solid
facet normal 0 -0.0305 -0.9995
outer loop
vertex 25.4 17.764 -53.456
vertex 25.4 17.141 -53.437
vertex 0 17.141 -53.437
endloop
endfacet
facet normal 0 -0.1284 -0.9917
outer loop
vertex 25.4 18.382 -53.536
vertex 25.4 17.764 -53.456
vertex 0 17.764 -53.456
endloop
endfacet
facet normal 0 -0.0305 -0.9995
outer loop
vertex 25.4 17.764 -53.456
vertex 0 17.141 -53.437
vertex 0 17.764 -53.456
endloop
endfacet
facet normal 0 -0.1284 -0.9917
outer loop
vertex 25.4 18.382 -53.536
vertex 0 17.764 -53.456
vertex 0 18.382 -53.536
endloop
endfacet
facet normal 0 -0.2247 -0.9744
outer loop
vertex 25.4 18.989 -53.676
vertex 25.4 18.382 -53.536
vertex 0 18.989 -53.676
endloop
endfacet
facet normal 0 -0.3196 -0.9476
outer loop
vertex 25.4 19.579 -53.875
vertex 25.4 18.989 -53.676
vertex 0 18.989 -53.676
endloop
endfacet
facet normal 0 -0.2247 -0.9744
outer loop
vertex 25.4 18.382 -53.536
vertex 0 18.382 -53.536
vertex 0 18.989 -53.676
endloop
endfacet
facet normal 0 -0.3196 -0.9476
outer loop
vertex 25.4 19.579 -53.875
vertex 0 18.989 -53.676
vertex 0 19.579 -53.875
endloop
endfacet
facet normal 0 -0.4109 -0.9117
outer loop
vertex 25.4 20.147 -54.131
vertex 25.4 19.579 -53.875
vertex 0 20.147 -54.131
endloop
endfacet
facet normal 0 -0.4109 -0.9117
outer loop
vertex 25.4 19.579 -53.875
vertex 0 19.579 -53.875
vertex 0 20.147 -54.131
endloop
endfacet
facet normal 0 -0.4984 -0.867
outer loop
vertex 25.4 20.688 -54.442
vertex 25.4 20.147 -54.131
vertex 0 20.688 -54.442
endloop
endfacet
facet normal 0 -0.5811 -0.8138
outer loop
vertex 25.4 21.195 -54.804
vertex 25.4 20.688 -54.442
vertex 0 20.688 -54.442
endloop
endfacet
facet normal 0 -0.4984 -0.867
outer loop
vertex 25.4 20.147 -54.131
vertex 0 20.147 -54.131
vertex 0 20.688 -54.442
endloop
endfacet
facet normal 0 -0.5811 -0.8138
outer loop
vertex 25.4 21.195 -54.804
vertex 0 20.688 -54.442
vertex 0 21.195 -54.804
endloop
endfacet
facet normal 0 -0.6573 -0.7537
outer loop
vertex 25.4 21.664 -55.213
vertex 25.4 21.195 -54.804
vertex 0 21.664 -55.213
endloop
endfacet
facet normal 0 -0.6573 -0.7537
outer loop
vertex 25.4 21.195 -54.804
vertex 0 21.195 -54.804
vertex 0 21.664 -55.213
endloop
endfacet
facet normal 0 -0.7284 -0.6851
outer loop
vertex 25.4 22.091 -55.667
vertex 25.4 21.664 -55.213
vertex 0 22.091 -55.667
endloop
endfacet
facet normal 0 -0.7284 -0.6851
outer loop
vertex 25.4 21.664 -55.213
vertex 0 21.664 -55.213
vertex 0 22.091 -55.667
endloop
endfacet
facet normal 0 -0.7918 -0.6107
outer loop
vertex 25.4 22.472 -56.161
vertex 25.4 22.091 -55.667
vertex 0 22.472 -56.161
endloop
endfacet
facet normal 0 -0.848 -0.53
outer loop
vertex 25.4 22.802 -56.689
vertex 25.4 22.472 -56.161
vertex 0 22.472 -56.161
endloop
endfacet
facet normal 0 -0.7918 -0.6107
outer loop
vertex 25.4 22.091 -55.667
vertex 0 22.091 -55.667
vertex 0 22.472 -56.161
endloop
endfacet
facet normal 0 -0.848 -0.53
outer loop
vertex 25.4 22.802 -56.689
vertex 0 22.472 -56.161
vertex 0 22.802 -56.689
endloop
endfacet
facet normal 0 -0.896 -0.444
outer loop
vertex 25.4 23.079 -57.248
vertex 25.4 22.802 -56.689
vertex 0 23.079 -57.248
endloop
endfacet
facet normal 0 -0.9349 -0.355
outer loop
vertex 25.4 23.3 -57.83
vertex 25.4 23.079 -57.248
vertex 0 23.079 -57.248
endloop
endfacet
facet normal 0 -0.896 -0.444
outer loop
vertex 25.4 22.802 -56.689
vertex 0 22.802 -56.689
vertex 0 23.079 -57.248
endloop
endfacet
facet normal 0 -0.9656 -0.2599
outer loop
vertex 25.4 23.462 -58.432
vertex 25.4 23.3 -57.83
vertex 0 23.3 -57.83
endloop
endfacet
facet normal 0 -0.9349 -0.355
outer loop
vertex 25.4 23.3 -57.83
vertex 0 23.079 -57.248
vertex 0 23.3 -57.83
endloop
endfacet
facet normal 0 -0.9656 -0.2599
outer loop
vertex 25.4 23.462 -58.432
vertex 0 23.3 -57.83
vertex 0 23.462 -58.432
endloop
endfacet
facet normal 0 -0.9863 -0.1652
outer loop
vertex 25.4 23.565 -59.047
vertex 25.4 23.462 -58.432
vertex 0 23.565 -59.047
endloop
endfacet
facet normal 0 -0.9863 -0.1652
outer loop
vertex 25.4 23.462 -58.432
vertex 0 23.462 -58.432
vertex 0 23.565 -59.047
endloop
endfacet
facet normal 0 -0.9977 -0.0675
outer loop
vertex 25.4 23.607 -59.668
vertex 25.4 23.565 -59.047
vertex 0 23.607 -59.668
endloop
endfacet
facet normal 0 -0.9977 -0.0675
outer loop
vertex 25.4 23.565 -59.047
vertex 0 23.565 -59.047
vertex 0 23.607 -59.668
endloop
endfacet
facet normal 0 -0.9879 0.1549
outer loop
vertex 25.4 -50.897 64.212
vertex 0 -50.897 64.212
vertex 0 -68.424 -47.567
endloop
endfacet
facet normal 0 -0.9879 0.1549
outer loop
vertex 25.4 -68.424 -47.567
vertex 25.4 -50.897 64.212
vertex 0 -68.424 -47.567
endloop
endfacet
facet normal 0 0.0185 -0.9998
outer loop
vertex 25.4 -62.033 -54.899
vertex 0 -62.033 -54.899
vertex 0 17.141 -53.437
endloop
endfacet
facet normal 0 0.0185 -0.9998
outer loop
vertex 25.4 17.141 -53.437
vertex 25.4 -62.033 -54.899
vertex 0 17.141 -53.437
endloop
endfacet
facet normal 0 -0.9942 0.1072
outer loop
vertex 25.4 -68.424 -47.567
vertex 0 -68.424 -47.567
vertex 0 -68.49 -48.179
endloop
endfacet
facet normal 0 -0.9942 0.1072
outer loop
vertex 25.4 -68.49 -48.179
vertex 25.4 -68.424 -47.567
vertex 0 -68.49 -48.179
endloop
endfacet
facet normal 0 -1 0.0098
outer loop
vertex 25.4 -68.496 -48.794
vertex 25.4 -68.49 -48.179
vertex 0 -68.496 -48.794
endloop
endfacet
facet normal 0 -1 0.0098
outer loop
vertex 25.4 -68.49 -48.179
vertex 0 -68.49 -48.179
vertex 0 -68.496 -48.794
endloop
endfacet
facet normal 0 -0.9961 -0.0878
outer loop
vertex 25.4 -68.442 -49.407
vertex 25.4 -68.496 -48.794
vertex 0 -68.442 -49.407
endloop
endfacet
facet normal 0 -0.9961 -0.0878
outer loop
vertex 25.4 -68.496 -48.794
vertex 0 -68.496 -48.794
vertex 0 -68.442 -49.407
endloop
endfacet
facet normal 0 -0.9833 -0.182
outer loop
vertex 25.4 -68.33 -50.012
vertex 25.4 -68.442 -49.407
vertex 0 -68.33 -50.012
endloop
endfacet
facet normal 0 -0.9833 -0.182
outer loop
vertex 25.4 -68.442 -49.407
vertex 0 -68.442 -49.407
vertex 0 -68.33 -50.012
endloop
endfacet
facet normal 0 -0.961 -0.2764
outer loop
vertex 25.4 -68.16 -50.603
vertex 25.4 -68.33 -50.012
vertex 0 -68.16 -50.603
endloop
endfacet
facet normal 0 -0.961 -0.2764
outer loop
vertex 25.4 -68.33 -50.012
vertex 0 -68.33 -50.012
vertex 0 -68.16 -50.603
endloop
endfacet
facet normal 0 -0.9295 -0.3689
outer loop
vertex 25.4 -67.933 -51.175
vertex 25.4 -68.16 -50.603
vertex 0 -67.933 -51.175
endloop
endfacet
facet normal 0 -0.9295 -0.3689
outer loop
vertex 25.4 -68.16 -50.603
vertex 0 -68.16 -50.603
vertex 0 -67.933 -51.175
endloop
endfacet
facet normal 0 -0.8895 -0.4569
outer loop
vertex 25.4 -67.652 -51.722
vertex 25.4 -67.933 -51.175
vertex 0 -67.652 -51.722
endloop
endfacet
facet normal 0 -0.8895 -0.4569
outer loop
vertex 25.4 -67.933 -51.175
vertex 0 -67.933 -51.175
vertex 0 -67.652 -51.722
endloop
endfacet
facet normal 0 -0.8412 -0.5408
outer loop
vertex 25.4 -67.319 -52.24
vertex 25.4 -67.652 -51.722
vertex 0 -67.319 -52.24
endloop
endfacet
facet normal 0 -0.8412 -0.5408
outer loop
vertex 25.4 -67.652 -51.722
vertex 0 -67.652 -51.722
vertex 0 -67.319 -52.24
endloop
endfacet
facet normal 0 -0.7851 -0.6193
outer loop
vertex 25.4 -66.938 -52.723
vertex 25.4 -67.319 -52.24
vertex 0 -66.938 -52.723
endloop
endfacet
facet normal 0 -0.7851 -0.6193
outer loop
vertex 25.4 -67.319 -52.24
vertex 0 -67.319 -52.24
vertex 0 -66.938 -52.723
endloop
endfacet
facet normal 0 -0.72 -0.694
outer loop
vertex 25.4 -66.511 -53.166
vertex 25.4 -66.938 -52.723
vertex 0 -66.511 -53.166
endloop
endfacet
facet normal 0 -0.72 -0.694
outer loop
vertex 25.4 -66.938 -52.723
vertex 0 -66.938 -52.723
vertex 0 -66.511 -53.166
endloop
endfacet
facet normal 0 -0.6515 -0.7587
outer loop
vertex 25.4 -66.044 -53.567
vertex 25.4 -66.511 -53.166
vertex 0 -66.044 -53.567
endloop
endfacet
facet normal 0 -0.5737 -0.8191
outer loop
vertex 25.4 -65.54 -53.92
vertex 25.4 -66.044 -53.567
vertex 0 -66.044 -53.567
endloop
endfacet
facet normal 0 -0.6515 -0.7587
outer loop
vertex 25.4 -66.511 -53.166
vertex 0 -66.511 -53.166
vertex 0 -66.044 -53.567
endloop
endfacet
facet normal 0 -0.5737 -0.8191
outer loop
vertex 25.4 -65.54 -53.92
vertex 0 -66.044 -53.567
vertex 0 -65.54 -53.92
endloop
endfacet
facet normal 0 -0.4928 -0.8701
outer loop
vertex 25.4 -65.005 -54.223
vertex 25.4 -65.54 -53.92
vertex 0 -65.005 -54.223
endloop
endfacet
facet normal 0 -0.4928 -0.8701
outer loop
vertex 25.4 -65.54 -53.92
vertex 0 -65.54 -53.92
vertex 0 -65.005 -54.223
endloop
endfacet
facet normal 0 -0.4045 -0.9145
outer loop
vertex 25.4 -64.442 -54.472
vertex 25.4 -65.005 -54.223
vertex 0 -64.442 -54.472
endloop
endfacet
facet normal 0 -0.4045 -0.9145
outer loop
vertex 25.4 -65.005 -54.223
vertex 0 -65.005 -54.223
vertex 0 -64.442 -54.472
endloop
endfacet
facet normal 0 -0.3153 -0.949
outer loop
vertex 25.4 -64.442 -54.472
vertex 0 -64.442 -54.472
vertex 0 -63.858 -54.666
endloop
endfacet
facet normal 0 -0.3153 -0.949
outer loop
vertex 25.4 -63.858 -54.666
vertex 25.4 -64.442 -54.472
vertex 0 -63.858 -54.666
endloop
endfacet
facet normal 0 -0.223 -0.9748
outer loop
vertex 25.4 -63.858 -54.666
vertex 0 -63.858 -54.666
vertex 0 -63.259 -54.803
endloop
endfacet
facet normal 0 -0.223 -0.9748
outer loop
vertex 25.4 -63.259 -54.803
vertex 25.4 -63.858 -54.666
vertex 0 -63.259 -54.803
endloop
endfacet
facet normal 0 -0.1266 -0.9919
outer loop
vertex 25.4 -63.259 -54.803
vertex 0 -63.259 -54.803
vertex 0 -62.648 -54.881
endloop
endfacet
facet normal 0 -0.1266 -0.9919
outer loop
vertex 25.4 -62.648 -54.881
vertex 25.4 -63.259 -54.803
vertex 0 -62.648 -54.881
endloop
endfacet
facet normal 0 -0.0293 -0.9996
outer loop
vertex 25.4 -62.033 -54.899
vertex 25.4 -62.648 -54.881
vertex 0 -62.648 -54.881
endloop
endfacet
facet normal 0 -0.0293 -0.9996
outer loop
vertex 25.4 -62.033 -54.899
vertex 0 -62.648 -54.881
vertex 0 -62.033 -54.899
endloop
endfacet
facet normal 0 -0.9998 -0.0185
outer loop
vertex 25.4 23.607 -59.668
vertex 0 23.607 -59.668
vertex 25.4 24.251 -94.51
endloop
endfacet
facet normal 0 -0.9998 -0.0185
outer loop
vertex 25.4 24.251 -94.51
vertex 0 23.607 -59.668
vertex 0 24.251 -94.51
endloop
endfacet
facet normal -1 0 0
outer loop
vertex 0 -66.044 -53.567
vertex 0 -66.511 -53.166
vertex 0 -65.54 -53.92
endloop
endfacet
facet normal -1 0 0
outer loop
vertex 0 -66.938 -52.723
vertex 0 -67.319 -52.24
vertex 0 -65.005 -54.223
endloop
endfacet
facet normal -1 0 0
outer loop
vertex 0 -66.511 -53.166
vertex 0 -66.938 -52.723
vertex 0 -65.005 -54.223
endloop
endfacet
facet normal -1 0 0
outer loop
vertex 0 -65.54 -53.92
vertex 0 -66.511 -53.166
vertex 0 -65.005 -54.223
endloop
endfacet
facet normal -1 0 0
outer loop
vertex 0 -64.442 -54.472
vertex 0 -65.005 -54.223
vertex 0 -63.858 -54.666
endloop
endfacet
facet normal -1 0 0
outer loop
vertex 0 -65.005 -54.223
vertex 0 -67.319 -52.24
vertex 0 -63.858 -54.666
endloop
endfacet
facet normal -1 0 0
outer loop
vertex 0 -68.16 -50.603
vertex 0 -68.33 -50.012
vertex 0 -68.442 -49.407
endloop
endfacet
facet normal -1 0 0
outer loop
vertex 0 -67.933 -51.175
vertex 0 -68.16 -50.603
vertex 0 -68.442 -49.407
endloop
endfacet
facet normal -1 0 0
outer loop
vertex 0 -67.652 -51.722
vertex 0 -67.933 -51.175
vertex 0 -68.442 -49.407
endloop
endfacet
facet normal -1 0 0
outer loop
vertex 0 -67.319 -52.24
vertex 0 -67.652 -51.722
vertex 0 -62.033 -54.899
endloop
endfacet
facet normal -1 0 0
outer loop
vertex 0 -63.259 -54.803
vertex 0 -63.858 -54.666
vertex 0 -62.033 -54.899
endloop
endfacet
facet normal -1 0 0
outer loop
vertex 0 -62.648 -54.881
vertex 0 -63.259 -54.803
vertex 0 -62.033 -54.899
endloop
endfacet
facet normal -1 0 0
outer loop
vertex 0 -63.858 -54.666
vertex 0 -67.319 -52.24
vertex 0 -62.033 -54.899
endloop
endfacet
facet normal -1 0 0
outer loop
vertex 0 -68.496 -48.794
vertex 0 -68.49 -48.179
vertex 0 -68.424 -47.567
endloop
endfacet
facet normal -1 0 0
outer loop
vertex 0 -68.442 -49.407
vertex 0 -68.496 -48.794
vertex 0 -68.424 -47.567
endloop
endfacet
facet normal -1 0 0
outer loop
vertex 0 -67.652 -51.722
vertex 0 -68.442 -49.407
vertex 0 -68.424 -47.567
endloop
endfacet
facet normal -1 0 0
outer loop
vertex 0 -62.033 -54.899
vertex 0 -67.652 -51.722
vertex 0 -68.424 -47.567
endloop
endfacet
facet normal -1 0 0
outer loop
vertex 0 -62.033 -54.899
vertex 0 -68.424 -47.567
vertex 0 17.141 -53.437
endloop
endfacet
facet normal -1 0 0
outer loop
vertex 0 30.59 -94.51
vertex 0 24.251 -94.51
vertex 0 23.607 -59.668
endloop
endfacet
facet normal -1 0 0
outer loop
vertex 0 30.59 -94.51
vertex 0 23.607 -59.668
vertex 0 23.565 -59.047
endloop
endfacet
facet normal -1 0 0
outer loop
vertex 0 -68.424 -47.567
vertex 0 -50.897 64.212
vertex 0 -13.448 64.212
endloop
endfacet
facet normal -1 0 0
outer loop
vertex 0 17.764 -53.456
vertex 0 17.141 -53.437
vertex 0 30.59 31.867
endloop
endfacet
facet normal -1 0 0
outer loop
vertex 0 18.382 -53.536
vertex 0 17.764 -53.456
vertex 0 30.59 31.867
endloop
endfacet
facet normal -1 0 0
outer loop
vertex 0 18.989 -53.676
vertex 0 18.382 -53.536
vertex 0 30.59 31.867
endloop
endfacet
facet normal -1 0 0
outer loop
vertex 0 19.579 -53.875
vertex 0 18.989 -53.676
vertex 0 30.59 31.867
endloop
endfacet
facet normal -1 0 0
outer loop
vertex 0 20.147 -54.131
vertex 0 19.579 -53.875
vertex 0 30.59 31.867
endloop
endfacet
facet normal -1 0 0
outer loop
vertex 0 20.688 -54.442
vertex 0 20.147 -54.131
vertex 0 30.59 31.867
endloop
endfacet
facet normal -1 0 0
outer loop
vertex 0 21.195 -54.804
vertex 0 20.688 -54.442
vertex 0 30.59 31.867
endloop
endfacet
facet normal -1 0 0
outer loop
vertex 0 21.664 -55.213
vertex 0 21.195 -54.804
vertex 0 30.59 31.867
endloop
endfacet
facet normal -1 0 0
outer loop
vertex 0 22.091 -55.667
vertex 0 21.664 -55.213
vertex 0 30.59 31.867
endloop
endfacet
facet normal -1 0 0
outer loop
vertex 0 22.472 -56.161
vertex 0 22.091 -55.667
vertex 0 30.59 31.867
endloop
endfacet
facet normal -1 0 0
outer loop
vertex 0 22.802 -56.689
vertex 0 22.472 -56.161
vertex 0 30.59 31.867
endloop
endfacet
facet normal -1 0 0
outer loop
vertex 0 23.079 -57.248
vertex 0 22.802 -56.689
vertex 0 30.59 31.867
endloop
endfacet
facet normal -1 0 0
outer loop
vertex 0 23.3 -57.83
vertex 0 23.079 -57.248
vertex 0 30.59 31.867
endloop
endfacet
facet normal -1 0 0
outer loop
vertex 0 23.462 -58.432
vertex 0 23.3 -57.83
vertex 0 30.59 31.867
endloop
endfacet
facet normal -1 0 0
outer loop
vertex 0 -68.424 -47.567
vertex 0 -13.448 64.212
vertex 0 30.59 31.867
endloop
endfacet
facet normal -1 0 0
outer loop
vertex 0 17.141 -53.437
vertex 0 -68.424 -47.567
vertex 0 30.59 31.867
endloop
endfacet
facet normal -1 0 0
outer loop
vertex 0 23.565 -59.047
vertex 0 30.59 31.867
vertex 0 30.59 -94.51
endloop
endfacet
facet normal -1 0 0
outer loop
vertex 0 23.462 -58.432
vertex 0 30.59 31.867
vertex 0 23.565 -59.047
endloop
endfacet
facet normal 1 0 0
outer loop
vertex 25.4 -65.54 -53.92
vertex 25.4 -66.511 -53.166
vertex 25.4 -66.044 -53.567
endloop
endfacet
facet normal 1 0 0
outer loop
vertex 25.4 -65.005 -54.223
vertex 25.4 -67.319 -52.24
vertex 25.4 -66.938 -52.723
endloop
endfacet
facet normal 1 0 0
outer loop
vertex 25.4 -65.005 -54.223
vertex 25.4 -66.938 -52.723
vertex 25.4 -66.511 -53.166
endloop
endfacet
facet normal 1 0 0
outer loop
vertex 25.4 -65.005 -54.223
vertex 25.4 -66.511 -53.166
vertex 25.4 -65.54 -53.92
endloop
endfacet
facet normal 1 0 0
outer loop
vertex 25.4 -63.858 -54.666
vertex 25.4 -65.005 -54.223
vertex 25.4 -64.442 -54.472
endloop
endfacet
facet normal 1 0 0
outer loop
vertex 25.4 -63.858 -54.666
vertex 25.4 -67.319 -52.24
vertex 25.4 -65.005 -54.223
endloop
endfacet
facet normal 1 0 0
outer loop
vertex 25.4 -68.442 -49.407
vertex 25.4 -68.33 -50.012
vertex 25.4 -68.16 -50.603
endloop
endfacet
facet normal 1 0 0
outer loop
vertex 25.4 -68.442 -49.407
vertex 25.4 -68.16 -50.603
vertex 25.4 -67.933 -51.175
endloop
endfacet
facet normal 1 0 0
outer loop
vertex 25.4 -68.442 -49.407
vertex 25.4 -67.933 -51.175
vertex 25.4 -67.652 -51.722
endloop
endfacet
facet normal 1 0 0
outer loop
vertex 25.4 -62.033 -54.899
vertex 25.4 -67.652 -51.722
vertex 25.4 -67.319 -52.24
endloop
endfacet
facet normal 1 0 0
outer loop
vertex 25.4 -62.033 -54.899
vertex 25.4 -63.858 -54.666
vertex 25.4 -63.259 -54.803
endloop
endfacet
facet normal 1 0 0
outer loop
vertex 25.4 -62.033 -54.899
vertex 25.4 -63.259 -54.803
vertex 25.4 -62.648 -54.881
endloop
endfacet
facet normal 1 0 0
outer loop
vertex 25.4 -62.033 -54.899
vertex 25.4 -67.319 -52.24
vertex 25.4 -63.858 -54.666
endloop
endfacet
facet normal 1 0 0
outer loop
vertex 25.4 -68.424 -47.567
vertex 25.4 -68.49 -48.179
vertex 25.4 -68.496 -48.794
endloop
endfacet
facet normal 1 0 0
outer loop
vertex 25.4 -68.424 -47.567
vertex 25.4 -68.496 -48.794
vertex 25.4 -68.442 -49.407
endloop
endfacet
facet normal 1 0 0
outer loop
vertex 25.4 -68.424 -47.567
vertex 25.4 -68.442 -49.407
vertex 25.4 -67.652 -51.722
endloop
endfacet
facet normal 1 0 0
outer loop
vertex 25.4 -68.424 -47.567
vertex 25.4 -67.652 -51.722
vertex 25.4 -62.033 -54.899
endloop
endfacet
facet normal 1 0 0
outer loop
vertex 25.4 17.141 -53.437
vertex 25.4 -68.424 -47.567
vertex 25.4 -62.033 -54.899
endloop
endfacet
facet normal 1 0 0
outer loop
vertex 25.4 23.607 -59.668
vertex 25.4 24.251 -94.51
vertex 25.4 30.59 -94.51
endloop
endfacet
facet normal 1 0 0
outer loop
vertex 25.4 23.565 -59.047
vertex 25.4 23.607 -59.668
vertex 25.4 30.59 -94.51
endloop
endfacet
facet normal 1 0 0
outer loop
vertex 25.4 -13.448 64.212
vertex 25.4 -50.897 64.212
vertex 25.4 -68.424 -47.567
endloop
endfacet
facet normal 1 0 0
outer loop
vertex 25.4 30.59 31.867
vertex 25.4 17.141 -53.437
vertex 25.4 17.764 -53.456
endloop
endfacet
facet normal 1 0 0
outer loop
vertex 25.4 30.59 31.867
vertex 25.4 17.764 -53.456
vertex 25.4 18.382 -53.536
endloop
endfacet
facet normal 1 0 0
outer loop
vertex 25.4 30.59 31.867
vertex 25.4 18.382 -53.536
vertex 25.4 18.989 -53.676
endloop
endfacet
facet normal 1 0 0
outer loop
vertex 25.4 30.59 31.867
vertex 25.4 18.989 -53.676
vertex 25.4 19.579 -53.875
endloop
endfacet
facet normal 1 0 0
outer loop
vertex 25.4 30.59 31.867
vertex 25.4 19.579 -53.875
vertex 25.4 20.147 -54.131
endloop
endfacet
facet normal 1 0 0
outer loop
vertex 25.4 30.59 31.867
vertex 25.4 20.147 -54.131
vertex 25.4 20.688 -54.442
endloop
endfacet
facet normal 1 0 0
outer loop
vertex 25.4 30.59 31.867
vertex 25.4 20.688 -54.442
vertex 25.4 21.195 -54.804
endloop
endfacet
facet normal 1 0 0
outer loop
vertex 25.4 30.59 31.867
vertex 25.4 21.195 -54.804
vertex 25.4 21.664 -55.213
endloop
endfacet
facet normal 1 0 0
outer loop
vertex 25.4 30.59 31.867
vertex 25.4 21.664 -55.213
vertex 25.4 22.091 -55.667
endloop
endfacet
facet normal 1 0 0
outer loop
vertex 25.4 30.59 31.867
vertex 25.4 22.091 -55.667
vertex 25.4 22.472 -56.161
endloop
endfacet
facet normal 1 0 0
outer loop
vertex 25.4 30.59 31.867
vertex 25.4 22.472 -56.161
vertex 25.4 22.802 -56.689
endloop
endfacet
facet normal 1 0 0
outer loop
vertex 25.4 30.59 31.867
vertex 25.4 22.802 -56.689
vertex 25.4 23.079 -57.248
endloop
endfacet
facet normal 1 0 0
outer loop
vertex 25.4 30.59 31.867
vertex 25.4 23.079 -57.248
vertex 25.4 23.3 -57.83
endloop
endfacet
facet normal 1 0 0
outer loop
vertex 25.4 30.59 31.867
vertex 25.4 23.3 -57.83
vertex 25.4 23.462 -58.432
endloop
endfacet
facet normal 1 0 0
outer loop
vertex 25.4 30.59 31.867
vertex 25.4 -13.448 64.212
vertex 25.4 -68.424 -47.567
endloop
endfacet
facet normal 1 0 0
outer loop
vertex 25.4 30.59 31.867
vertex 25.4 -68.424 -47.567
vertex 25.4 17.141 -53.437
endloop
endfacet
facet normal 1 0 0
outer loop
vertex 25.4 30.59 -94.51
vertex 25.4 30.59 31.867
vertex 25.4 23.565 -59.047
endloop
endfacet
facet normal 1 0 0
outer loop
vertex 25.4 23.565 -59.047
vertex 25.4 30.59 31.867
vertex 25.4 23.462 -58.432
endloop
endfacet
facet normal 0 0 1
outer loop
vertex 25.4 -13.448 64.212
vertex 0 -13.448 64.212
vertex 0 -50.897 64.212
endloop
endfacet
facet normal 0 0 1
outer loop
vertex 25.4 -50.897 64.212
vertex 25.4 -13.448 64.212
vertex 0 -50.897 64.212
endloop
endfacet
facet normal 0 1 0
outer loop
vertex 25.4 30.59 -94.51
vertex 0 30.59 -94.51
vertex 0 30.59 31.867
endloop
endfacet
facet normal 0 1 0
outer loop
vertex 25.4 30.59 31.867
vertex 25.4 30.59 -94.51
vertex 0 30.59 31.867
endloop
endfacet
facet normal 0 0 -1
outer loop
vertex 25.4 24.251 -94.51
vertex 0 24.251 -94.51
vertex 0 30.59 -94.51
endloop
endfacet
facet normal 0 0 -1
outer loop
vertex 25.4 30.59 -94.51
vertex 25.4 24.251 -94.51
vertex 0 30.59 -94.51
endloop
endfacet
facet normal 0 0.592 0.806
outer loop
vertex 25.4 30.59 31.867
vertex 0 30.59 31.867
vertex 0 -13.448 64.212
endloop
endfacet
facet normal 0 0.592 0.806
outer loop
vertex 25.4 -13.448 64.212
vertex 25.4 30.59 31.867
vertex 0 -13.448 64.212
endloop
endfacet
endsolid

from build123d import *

# Parameters (mm, degrees)
F1_DEPTH = 25.4


# Not quite as in the source:
# - the program builds the solid bodies; features that only make, move or delete a surface that nothing else refers to are left out


with BuildPart() as f1:
    # F0 (on Right) → F1 (new body)
    with BuildSketch(Plane.YZ):
        with BuildLine():
            Line((30.5899139494, 31.8673923612), (-13.4478956461, 64.2119422555))
            Line((-13.4478956461, 64.2119422555), (-50.8971004581, 64.2119422555))
            Line((-50.8971004581, 64.2119422555), (-68.4238471531, -47.566784402))
            ThreePointArc((-68.4238471531, -47.566784402), (-66.9375558311, -52.7225543163), (-62.0332139244, -54.8993537478))
            Line((-62.0332139244, -54.8993537478), (17.1407288117, -53.4367848312))
            ThreePointArc((17.1407288117, -53.4367848312), (21.6644422357, -55.21340817), (23.6069282635, -59.6684190188))
            Line((23.6069282635, -59.6684190188), (24.2505592335, -94.5104021757))
            Line((24.2505592335, -94.5104021757), (30.5899139494, -94.5104021757))
            Line((30.5899139494, -94.5104021757), (30.5899139494, 31.8673923612))
        make_face()
    extrude(amount=F1_DEPTH)


solid = f1.part
